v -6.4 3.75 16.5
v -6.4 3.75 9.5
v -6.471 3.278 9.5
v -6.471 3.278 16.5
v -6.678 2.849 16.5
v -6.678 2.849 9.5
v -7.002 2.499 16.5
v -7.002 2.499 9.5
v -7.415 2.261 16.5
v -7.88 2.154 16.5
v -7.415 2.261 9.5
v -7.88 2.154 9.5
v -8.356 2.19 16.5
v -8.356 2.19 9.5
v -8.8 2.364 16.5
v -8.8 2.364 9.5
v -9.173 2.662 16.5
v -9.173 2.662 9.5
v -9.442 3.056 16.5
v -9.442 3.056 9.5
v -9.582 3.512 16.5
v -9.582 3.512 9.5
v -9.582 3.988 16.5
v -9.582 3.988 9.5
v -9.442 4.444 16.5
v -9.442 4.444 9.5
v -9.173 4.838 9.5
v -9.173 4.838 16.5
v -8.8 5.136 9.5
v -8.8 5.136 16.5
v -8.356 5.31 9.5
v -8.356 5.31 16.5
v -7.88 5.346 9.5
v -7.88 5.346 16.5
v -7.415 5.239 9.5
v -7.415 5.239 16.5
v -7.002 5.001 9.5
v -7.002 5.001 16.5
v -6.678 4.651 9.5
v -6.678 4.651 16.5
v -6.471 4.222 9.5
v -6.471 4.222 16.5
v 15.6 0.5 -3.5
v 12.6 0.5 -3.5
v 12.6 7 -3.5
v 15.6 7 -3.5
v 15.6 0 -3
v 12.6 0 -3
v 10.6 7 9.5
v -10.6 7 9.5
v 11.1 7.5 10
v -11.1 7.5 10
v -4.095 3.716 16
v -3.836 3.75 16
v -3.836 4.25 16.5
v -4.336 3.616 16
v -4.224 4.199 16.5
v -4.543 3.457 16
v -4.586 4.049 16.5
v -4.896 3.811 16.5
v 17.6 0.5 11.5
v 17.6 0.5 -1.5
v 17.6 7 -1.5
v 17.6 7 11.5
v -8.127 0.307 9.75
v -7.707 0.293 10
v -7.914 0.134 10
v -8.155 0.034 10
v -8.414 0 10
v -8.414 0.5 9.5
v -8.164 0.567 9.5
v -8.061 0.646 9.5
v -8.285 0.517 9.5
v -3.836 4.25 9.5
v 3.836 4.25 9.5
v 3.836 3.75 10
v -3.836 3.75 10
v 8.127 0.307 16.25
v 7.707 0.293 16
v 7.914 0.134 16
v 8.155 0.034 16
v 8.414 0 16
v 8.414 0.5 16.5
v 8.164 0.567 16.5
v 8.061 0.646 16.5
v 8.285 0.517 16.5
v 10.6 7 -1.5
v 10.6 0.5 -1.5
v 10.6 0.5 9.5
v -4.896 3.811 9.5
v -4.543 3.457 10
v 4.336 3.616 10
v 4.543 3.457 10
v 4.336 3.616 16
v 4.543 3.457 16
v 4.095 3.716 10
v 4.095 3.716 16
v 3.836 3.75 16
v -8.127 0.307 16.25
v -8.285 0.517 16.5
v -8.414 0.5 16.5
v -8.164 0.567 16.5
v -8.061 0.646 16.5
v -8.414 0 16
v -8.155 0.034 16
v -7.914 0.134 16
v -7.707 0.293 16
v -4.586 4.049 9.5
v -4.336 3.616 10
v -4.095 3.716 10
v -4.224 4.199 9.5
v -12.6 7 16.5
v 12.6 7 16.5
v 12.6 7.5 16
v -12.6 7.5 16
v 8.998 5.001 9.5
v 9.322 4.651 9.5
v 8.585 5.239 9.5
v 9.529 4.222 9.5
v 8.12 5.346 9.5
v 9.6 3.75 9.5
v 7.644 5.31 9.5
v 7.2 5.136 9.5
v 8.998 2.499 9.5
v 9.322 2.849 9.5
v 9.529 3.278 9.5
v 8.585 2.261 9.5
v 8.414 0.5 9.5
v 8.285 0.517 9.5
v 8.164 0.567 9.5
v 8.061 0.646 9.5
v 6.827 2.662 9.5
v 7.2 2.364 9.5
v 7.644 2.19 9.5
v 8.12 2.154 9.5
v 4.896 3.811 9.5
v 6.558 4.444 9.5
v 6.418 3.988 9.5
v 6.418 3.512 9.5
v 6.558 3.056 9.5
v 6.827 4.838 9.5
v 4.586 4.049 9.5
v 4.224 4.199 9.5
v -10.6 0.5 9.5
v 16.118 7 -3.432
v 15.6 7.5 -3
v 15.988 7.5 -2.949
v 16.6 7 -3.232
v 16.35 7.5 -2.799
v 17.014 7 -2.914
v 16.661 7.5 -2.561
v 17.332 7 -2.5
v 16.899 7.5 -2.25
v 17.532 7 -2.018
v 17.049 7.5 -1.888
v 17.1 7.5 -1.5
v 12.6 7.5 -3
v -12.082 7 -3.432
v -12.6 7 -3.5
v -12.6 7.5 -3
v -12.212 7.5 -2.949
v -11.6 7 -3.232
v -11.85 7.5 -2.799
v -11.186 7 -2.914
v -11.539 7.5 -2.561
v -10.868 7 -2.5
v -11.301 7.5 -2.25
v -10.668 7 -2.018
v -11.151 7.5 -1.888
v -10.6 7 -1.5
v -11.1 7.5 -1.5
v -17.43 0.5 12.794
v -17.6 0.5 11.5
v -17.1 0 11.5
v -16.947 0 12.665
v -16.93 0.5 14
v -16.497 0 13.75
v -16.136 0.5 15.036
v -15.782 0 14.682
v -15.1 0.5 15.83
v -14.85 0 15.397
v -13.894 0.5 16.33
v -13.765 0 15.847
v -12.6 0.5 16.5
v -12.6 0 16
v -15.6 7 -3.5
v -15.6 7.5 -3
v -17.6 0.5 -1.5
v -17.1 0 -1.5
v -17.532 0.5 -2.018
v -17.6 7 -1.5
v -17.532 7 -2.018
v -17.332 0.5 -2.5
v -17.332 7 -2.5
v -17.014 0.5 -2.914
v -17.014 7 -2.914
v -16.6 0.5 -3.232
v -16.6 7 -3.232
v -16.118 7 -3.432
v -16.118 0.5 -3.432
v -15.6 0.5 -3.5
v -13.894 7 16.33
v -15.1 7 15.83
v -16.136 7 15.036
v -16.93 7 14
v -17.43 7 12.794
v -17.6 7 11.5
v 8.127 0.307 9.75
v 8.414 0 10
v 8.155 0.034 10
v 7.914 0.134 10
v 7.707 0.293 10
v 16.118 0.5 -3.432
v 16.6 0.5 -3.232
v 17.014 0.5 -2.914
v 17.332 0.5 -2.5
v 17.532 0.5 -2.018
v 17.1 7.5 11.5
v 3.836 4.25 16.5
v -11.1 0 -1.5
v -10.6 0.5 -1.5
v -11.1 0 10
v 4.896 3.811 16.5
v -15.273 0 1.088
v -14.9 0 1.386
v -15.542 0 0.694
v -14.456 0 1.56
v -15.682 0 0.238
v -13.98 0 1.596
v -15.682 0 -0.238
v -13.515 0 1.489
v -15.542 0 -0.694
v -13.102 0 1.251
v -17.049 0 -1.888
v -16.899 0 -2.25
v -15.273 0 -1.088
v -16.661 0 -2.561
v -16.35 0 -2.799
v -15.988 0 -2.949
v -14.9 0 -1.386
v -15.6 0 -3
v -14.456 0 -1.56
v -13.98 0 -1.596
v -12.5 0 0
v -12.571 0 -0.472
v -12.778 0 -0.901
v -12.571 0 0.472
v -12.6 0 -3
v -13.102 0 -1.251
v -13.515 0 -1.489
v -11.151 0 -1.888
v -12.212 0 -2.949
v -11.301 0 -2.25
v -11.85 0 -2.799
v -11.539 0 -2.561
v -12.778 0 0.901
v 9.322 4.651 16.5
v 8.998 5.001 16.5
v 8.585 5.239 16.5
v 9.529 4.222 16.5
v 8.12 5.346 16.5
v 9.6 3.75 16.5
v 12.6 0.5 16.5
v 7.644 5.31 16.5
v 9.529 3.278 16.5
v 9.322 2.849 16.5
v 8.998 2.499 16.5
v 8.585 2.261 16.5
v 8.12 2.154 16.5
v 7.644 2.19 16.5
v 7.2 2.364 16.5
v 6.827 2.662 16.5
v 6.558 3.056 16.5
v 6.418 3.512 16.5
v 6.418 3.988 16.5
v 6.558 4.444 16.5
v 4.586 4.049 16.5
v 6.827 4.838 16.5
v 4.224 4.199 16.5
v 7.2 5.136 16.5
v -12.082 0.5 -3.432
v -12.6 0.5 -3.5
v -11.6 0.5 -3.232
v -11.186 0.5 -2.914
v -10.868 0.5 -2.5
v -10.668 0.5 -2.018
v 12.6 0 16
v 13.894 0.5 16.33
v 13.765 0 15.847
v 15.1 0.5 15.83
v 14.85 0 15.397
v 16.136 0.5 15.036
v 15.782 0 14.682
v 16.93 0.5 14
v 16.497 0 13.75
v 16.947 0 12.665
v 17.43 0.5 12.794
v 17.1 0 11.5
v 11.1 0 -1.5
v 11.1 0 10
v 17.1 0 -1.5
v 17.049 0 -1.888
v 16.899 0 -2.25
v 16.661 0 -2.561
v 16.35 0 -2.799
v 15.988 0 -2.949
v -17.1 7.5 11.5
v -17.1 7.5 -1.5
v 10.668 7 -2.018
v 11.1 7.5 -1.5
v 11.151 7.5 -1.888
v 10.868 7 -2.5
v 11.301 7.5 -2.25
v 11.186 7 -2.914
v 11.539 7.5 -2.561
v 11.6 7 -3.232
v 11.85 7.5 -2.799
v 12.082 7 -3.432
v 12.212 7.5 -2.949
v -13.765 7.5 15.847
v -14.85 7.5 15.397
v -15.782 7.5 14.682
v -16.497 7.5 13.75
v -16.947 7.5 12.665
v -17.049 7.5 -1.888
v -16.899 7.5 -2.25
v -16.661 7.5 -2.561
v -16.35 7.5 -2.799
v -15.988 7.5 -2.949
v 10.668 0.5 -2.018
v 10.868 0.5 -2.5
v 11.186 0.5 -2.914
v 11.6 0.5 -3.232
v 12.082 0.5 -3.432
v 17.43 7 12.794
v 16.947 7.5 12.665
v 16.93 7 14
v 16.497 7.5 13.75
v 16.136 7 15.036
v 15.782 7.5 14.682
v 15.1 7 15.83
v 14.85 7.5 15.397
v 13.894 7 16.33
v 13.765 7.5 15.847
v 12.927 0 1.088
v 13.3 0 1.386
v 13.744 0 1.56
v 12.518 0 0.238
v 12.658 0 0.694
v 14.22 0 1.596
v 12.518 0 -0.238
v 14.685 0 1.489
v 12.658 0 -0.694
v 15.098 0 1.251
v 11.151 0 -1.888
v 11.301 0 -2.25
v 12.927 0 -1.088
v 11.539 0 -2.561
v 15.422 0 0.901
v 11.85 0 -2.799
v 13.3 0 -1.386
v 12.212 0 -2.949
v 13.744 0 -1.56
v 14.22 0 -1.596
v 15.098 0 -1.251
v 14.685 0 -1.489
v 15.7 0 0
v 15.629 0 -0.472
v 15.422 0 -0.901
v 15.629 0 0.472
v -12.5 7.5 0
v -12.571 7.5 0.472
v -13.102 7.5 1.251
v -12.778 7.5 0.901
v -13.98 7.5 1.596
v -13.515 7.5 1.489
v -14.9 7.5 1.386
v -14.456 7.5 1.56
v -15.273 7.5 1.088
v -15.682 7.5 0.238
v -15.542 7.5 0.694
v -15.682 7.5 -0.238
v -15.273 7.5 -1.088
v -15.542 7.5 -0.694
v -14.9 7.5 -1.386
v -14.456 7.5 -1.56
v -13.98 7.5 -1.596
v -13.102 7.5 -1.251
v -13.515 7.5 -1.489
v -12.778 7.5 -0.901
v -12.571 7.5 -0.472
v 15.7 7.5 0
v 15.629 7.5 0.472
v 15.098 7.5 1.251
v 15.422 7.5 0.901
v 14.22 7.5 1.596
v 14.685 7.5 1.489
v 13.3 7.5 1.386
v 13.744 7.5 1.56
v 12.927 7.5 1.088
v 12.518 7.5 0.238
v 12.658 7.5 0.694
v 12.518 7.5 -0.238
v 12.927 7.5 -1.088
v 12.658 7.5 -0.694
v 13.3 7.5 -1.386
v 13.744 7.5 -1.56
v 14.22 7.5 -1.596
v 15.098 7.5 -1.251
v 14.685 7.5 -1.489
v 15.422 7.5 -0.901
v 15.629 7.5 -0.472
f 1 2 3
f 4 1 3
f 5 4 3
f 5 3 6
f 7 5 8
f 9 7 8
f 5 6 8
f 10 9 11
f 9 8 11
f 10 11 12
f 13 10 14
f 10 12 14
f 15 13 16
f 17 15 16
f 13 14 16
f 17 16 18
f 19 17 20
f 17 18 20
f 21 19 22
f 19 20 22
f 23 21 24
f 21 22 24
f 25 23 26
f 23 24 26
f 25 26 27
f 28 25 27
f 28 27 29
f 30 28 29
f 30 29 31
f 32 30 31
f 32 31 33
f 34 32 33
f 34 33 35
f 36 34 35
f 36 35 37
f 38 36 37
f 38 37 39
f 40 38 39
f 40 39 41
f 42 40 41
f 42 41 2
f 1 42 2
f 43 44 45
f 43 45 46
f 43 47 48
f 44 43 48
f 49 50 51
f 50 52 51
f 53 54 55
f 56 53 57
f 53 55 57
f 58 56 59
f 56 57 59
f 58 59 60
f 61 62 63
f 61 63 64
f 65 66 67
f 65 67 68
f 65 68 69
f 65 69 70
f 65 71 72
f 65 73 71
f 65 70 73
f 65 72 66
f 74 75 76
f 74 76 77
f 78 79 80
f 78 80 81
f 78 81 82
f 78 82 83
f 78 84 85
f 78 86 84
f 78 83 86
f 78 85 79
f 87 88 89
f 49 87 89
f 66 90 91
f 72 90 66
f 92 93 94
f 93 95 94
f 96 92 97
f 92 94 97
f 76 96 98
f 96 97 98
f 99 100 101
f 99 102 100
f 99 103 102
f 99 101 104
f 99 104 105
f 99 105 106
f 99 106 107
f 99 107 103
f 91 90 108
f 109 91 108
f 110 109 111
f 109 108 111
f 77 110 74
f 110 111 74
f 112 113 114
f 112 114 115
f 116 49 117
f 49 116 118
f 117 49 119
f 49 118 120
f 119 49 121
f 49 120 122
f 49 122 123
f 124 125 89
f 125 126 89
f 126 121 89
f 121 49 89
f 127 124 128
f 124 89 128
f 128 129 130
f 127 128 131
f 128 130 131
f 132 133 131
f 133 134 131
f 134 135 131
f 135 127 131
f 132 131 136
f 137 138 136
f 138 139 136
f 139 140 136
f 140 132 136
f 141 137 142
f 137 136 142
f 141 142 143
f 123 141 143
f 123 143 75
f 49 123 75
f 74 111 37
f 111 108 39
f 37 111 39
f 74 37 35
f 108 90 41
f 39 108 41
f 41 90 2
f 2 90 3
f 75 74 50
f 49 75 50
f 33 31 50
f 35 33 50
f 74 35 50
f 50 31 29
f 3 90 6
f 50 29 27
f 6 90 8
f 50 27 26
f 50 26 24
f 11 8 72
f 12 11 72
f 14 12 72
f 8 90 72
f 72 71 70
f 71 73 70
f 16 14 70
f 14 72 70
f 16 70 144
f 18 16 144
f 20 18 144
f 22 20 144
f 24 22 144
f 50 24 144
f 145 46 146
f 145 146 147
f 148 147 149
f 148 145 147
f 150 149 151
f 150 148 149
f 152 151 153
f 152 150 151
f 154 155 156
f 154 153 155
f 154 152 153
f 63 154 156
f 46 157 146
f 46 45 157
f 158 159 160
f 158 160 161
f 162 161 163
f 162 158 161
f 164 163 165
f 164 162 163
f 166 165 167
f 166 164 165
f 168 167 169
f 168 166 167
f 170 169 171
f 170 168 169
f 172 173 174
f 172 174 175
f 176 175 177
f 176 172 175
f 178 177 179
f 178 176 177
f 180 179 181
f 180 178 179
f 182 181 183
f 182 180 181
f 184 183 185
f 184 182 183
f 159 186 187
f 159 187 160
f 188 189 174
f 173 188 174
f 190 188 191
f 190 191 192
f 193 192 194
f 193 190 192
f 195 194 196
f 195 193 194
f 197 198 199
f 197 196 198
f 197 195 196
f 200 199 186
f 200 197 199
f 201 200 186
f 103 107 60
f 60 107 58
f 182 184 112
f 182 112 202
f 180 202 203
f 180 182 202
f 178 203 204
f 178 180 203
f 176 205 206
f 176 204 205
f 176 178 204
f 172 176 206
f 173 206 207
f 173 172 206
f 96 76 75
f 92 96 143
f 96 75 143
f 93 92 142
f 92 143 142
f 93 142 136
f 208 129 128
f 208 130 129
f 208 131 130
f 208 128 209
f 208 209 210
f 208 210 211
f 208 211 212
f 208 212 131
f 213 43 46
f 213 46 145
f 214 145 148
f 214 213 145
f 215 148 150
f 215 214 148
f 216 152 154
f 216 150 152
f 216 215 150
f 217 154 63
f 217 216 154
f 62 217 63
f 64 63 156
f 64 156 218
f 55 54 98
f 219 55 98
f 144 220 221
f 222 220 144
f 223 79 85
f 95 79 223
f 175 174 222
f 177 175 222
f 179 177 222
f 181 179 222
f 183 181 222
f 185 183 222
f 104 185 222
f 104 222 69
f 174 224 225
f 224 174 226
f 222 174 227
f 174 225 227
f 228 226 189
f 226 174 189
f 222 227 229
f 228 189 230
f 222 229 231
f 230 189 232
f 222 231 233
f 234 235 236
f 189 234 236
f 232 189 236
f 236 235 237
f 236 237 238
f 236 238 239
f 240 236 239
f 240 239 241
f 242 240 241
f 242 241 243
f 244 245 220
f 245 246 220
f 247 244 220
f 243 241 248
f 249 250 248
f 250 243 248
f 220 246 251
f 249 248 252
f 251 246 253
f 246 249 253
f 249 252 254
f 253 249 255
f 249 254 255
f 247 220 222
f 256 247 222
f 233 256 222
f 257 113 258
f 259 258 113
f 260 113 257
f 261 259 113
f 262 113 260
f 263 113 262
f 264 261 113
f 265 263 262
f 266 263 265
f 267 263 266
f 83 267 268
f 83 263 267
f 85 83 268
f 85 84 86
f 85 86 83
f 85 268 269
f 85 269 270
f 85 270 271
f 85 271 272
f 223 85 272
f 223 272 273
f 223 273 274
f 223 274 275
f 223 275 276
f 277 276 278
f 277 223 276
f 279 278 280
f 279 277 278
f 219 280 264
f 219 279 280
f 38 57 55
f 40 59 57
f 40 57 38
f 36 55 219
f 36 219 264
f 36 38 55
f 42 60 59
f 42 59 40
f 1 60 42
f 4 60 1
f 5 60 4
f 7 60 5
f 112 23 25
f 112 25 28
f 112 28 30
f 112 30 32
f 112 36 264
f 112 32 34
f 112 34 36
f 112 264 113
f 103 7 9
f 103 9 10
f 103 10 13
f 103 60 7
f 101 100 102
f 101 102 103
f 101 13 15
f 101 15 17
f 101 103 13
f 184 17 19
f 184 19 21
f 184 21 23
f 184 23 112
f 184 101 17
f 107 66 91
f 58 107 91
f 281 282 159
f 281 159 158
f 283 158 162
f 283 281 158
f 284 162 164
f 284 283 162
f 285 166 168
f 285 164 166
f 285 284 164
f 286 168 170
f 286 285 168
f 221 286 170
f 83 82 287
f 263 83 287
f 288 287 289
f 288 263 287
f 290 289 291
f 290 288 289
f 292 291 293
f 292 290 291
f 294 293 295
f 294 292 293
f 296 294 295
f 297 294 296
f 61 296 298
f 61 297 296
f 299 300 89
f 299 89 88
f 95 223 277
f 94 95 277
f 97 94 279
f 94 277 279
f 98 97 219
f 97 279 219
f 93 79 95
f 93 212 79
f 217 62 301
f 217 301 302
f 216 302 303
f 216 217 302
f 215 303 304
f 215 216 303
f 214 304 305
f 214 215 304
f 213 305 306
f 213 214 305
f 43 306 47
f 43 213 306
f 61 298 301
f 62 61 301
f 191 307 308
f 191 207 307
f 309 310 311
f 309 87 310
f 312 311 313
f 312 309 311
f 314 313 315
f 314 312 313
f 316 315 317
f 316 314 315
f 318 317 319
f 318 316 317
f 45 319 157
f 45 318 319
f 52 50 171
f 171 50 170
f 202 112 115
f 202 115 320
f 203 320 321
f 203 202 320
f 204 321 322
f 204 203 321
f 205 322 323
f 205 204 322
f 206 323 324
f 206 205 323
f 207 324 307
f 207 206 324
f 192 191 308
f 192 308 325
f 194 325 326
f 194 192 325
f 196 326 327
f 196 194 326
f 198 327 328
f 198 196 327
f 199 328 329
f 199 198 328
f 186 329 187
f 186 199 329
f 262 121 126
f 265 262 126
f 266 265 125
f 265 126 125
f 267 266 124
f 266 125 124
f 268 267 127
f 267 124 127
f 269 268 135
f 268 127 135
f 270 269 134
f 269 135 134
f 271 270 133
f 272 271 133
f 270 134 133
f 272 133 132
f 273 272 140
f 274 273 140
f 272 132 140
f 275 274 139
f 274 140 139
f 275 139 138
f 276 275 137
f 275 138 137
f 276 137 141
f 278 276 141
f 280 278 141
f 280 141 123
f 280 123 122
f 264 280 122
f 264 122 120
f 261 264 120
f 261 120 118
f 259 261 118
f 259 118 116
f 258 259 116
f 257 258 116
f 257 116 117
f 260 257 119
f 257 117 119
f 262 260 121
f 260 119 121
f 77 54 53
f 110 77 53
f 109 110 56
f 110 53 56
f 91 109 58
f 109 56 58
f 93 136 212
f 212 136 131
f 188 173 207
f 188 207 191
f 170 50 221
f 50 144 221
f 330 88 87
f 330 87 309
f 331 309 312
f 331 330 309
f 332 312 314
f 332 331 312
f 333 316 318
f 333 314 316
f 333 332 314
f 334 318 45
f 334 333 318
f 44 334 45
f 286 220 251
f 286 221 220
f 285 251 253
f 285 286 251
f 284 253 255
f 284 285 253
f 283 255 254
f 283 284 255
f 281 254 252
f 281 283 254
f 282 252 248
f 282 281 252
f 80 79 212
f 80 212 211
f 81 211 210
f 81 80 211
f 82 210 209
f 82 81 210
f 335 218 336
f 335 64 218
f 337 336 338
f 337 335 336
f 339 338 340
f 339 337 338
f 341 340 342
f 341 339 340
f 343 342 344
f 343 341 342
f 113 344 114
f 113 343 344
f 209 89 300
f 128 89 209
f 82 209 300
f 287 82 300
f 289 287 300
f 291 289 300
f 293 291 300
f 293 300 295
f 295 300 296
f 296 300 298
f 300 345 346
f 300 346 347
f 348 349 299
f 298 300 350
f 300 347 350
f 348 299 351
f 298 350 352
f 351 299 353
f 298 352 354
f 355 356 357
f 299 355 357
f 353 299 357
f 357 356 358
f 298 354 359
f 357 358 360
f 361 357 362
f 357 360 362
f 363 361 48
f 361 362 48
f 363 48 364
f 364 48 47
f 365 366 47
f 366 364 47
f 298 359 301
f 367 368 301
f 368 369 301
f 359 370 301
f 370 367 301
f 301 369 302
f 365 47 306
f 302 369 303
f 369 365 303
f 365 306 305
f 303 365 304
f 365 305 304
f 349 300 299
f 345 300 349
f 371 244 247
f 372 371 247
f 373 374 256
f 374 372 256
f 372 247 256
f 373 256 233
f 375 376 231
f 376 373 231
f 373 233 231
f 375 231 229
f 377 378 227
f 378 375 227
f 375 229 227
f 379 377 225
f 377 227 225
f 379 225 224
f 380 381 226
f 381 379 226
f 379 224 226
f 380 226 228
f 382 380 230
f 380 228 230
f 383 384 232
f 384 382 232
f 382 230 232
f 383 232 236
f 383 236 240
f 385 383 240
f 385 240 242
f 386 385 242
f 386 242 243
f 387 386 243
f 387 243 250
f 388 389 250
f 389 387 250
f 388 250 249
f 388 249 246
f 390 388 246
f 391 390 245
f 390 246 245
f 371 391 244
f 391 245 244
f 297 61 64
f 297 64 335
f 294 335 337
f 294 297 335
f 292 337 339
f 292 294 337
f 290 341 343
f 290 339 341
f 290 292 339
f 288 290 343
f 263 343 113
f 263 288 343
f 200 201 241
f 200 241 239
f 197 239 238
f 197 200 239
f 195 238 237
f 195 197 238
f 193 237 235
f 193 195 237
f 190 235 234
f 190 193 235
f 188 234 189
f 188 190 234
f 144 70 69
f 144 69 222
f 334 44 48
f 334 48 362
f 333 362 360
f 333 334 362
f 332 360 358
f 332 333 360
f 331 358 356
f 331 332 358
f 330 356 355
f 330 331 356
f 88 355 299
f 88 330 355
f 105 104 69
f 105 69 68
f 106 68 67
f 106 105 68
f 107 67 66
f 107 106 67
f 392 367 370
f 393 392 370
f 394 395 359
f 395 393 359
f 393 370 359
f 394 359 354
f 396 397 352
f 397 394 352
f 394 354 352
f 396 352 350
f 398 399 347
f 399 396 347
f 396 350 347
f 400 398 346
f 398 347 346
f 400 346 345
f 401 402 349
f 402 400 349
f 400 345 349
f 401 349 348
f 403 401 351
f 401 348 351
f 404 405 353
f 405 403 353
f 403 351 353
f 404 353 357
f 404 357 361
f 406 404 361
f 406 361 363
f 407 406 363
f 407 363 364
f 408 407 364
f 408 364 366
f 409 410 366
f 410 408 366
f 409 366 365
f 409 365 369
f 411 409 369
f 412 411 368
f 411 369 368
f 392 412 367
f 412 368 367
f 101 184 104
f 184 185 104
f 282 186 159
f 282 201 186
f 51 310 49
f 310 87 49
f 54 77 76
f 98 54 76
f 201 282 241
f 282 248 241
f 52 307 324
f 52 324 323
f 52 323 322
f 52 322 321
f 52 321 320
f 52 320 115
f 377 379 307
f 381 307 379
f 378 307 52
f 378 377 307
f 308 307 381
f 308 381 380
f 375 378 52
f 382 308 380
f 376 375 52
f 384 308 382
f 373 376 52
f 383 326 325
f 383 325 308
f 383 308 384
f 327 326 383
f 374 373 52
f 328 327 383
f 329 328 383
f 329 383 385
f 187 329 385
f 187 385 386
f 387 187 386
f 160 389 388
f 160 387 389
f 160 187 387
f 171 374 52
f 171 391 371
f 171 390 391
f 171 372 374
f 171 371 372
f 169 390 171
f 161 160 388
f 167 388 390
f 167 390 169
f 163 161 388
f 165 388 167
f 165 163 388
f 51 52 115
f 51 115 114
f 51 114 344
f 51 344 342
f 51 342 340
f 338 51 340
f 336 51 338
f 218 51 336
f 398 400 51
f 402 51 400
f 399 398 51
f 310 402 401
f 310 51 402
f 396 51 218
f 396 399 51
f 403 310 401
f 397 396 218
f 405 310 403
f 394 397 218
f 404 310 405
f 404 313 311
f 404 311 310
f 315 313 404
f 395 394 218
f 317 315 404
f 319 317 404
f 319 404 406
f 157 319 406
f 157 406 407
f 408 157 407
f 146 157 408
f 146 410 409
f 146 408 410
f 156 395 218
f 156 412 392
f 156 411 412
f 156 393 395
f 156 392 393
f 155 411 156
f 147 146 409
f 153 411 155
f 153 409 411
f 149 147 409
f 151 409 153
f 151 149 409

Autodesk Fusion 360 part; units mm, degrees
sketch "Sketch1" plane through (0, 0, 0) normal (0, 1, 0) x (1, 0, 0)
  circle A0 centre (-14.1, 0) radius 1.6
  circle A1 centre (14.1, 0) radius 1.6
  line L0 (17.6, 1.5) -> (17.6, -11.5)
  line L1 (12.6, -16.5) -> (-12.6, -16.5)
  line L2 (-17.6, -11.5) -> (-17.6, 1.5)
  line L3 (10.6, 1.5) -> (10.6, -7.5)
  line L4 (-10.6, -7.5) -> (-10.6, 1.5)
  line L5 (12.6, 3.5) -> (15.6, 3.5)
  line L6 (-15.6, 3.5) -> (-12.6, 3.5)
  arc A2 (-17.6, -11.5) -> (-12.6, -16.5) centre (-12.6, -11.5) ccw
  arc A3 (12.6, -16.5) -> (17.6, -11.5) centre (12.6, -11.5) ccw
  arc A4 (-15.6, 3.5) -> (-17.6, 1.5) centre (-15.6, 1.5) ccw
  arc A5 (-10.6, 1.5) -> (-12.6, 3.5) centre (-12.6, 1.5) ccw
  arc A6 (12.6, 3.5) -> (10.6, 1.5) centre (12.6, 1.5) ccw
  arc A7 (17.6, 1.5) -> (15.6, 3.5) centre (15.6, 1.5) ccw
  line L7 (10.6, -7.5) -> (10.6, -9.5)
  line L8 (10.6, -9.5) -> (-10.6, -9.5)
  line L9 (-10.6, -9.5) -> (-10.6, -7.5)
  dimension "d2" = 14.1
  dimension "d3" = 3.2
  dimension "d4" = 3.2
  dimension "d11" = 5
  dimension "d12" = 2
extrude "Extrude1" add sketch "Sketch1" along normal blind 7.5
sketch "Sketch2" plane through (0, 0, 9.5) normal (0, 0, -1) x (1, 0, 0)
  line L0 (8.6, 0) -> (-8.6, 0)
  line L1 (-12.6, 0) -> (12.6, 0)
  line L2 (-8, 0) -> (-2.6967, 0) construction
  line L3 (-12.6, 0) -> (12.6, 0)
  line L4 (10.6, 0) -> (-10.6, 0)
  line L5 (-10.6, 0) -> (-10.6, -7.5)
  line L6 (-10.6, -7.5) -> (10.6, -7.5)
  line L7 (10.6, -7.5) -> (10.6, 0)
  circle A0 centre (8, -3.75) radius 1.6
  line L8 (-12.6, -7.5) -> (-12.6, 0)
  line L9 (8, 0) -> (4.25, -3.75)
  line L10 (12.6, -7.5) -> (-12.6, -7.5)
  line L11 (0, -3.75) -> (8, -3.75)
  circle A1 centre (-8, -3.75) radius 1.6
  line L12 (12.6, 0) -> (12.6, -7.5)
  line L13 (-8, 0) -> (-4.25, -3.75)
  line L14 (0, -3.75) -> (-8, -3.75)
  point P0 (0, -3.75)
extrude "Extrude2" cut sketch "Sketch2" against normal blind 8 contours A0 | A1 | L0 L1 L3 L4 L9 L11 L13 L14
fillet "Fillet2" radius 1 4 edges at (-8, 0, 13) (-4.25, 3.75, 13) (4.25, 3.75, 13) (8, 0, 13)
chamfer "Chamfer5" distance 0.5 angle 45 44 edges at (-10.6, 7.5, 4) (-11.1858, 7.5, -2.9142) (-14.1, 7.5, -3.5) (-17.0142, 7.5, -2.9142) (-17.6, 7.5, 5) (-16.1355, 7.5, 15.0355) (0, 7.5, 16.5) (16.1355, 7.5, 15.0355) (17.6, 7.5, 5) (17.0142, 7.5, -2.9142) (14.1, 7.5, -3.5) (11.1858, 7.5, -2.9142) (10.6, 7.5, 4) (0, 7.5, 9.5) (-10.6, 0, 4) (-11.1858, 0, -2.9142) (-14.1, 0, -3.5) (-17.0142, 0, -2.9142) (-17.6, 0, 5) (-16.1355, 0, 15.0355) (-10.5071, 0, 16.5) (-8.0315, 0.0761, 16.5) (-6.125, 1.875, 16.5) (-4.2185, 3.6739, 16.5) (0, 3.75, 16.5) (4.2185, 3.6739, 16.5) (6.125, 1.875, 16.5) (8.0315, 0.0761, 16.5) (10.5071, 0, 16.5) (16.1355, 0, 15.0355) (17.6, 0, 5) (17.0142, 0, -2.9142) (14.1, 0, -3.5) (11.1858, 0, -2.9142) (10.6, 0, 4) (9.5071, 0, 9.5) (8.0315, 0.0761, 9.5) (6.125, 1.875, 9.5) (4.2185, 3.6739, 9.5) (0, 3.75, 9.5) (-4.2185, 3.6739, 9.5) (-6.125, 1.875, 9.5) (-8.0315, 0.0761, 9.5) (-9.5071, 0, 9.5)
